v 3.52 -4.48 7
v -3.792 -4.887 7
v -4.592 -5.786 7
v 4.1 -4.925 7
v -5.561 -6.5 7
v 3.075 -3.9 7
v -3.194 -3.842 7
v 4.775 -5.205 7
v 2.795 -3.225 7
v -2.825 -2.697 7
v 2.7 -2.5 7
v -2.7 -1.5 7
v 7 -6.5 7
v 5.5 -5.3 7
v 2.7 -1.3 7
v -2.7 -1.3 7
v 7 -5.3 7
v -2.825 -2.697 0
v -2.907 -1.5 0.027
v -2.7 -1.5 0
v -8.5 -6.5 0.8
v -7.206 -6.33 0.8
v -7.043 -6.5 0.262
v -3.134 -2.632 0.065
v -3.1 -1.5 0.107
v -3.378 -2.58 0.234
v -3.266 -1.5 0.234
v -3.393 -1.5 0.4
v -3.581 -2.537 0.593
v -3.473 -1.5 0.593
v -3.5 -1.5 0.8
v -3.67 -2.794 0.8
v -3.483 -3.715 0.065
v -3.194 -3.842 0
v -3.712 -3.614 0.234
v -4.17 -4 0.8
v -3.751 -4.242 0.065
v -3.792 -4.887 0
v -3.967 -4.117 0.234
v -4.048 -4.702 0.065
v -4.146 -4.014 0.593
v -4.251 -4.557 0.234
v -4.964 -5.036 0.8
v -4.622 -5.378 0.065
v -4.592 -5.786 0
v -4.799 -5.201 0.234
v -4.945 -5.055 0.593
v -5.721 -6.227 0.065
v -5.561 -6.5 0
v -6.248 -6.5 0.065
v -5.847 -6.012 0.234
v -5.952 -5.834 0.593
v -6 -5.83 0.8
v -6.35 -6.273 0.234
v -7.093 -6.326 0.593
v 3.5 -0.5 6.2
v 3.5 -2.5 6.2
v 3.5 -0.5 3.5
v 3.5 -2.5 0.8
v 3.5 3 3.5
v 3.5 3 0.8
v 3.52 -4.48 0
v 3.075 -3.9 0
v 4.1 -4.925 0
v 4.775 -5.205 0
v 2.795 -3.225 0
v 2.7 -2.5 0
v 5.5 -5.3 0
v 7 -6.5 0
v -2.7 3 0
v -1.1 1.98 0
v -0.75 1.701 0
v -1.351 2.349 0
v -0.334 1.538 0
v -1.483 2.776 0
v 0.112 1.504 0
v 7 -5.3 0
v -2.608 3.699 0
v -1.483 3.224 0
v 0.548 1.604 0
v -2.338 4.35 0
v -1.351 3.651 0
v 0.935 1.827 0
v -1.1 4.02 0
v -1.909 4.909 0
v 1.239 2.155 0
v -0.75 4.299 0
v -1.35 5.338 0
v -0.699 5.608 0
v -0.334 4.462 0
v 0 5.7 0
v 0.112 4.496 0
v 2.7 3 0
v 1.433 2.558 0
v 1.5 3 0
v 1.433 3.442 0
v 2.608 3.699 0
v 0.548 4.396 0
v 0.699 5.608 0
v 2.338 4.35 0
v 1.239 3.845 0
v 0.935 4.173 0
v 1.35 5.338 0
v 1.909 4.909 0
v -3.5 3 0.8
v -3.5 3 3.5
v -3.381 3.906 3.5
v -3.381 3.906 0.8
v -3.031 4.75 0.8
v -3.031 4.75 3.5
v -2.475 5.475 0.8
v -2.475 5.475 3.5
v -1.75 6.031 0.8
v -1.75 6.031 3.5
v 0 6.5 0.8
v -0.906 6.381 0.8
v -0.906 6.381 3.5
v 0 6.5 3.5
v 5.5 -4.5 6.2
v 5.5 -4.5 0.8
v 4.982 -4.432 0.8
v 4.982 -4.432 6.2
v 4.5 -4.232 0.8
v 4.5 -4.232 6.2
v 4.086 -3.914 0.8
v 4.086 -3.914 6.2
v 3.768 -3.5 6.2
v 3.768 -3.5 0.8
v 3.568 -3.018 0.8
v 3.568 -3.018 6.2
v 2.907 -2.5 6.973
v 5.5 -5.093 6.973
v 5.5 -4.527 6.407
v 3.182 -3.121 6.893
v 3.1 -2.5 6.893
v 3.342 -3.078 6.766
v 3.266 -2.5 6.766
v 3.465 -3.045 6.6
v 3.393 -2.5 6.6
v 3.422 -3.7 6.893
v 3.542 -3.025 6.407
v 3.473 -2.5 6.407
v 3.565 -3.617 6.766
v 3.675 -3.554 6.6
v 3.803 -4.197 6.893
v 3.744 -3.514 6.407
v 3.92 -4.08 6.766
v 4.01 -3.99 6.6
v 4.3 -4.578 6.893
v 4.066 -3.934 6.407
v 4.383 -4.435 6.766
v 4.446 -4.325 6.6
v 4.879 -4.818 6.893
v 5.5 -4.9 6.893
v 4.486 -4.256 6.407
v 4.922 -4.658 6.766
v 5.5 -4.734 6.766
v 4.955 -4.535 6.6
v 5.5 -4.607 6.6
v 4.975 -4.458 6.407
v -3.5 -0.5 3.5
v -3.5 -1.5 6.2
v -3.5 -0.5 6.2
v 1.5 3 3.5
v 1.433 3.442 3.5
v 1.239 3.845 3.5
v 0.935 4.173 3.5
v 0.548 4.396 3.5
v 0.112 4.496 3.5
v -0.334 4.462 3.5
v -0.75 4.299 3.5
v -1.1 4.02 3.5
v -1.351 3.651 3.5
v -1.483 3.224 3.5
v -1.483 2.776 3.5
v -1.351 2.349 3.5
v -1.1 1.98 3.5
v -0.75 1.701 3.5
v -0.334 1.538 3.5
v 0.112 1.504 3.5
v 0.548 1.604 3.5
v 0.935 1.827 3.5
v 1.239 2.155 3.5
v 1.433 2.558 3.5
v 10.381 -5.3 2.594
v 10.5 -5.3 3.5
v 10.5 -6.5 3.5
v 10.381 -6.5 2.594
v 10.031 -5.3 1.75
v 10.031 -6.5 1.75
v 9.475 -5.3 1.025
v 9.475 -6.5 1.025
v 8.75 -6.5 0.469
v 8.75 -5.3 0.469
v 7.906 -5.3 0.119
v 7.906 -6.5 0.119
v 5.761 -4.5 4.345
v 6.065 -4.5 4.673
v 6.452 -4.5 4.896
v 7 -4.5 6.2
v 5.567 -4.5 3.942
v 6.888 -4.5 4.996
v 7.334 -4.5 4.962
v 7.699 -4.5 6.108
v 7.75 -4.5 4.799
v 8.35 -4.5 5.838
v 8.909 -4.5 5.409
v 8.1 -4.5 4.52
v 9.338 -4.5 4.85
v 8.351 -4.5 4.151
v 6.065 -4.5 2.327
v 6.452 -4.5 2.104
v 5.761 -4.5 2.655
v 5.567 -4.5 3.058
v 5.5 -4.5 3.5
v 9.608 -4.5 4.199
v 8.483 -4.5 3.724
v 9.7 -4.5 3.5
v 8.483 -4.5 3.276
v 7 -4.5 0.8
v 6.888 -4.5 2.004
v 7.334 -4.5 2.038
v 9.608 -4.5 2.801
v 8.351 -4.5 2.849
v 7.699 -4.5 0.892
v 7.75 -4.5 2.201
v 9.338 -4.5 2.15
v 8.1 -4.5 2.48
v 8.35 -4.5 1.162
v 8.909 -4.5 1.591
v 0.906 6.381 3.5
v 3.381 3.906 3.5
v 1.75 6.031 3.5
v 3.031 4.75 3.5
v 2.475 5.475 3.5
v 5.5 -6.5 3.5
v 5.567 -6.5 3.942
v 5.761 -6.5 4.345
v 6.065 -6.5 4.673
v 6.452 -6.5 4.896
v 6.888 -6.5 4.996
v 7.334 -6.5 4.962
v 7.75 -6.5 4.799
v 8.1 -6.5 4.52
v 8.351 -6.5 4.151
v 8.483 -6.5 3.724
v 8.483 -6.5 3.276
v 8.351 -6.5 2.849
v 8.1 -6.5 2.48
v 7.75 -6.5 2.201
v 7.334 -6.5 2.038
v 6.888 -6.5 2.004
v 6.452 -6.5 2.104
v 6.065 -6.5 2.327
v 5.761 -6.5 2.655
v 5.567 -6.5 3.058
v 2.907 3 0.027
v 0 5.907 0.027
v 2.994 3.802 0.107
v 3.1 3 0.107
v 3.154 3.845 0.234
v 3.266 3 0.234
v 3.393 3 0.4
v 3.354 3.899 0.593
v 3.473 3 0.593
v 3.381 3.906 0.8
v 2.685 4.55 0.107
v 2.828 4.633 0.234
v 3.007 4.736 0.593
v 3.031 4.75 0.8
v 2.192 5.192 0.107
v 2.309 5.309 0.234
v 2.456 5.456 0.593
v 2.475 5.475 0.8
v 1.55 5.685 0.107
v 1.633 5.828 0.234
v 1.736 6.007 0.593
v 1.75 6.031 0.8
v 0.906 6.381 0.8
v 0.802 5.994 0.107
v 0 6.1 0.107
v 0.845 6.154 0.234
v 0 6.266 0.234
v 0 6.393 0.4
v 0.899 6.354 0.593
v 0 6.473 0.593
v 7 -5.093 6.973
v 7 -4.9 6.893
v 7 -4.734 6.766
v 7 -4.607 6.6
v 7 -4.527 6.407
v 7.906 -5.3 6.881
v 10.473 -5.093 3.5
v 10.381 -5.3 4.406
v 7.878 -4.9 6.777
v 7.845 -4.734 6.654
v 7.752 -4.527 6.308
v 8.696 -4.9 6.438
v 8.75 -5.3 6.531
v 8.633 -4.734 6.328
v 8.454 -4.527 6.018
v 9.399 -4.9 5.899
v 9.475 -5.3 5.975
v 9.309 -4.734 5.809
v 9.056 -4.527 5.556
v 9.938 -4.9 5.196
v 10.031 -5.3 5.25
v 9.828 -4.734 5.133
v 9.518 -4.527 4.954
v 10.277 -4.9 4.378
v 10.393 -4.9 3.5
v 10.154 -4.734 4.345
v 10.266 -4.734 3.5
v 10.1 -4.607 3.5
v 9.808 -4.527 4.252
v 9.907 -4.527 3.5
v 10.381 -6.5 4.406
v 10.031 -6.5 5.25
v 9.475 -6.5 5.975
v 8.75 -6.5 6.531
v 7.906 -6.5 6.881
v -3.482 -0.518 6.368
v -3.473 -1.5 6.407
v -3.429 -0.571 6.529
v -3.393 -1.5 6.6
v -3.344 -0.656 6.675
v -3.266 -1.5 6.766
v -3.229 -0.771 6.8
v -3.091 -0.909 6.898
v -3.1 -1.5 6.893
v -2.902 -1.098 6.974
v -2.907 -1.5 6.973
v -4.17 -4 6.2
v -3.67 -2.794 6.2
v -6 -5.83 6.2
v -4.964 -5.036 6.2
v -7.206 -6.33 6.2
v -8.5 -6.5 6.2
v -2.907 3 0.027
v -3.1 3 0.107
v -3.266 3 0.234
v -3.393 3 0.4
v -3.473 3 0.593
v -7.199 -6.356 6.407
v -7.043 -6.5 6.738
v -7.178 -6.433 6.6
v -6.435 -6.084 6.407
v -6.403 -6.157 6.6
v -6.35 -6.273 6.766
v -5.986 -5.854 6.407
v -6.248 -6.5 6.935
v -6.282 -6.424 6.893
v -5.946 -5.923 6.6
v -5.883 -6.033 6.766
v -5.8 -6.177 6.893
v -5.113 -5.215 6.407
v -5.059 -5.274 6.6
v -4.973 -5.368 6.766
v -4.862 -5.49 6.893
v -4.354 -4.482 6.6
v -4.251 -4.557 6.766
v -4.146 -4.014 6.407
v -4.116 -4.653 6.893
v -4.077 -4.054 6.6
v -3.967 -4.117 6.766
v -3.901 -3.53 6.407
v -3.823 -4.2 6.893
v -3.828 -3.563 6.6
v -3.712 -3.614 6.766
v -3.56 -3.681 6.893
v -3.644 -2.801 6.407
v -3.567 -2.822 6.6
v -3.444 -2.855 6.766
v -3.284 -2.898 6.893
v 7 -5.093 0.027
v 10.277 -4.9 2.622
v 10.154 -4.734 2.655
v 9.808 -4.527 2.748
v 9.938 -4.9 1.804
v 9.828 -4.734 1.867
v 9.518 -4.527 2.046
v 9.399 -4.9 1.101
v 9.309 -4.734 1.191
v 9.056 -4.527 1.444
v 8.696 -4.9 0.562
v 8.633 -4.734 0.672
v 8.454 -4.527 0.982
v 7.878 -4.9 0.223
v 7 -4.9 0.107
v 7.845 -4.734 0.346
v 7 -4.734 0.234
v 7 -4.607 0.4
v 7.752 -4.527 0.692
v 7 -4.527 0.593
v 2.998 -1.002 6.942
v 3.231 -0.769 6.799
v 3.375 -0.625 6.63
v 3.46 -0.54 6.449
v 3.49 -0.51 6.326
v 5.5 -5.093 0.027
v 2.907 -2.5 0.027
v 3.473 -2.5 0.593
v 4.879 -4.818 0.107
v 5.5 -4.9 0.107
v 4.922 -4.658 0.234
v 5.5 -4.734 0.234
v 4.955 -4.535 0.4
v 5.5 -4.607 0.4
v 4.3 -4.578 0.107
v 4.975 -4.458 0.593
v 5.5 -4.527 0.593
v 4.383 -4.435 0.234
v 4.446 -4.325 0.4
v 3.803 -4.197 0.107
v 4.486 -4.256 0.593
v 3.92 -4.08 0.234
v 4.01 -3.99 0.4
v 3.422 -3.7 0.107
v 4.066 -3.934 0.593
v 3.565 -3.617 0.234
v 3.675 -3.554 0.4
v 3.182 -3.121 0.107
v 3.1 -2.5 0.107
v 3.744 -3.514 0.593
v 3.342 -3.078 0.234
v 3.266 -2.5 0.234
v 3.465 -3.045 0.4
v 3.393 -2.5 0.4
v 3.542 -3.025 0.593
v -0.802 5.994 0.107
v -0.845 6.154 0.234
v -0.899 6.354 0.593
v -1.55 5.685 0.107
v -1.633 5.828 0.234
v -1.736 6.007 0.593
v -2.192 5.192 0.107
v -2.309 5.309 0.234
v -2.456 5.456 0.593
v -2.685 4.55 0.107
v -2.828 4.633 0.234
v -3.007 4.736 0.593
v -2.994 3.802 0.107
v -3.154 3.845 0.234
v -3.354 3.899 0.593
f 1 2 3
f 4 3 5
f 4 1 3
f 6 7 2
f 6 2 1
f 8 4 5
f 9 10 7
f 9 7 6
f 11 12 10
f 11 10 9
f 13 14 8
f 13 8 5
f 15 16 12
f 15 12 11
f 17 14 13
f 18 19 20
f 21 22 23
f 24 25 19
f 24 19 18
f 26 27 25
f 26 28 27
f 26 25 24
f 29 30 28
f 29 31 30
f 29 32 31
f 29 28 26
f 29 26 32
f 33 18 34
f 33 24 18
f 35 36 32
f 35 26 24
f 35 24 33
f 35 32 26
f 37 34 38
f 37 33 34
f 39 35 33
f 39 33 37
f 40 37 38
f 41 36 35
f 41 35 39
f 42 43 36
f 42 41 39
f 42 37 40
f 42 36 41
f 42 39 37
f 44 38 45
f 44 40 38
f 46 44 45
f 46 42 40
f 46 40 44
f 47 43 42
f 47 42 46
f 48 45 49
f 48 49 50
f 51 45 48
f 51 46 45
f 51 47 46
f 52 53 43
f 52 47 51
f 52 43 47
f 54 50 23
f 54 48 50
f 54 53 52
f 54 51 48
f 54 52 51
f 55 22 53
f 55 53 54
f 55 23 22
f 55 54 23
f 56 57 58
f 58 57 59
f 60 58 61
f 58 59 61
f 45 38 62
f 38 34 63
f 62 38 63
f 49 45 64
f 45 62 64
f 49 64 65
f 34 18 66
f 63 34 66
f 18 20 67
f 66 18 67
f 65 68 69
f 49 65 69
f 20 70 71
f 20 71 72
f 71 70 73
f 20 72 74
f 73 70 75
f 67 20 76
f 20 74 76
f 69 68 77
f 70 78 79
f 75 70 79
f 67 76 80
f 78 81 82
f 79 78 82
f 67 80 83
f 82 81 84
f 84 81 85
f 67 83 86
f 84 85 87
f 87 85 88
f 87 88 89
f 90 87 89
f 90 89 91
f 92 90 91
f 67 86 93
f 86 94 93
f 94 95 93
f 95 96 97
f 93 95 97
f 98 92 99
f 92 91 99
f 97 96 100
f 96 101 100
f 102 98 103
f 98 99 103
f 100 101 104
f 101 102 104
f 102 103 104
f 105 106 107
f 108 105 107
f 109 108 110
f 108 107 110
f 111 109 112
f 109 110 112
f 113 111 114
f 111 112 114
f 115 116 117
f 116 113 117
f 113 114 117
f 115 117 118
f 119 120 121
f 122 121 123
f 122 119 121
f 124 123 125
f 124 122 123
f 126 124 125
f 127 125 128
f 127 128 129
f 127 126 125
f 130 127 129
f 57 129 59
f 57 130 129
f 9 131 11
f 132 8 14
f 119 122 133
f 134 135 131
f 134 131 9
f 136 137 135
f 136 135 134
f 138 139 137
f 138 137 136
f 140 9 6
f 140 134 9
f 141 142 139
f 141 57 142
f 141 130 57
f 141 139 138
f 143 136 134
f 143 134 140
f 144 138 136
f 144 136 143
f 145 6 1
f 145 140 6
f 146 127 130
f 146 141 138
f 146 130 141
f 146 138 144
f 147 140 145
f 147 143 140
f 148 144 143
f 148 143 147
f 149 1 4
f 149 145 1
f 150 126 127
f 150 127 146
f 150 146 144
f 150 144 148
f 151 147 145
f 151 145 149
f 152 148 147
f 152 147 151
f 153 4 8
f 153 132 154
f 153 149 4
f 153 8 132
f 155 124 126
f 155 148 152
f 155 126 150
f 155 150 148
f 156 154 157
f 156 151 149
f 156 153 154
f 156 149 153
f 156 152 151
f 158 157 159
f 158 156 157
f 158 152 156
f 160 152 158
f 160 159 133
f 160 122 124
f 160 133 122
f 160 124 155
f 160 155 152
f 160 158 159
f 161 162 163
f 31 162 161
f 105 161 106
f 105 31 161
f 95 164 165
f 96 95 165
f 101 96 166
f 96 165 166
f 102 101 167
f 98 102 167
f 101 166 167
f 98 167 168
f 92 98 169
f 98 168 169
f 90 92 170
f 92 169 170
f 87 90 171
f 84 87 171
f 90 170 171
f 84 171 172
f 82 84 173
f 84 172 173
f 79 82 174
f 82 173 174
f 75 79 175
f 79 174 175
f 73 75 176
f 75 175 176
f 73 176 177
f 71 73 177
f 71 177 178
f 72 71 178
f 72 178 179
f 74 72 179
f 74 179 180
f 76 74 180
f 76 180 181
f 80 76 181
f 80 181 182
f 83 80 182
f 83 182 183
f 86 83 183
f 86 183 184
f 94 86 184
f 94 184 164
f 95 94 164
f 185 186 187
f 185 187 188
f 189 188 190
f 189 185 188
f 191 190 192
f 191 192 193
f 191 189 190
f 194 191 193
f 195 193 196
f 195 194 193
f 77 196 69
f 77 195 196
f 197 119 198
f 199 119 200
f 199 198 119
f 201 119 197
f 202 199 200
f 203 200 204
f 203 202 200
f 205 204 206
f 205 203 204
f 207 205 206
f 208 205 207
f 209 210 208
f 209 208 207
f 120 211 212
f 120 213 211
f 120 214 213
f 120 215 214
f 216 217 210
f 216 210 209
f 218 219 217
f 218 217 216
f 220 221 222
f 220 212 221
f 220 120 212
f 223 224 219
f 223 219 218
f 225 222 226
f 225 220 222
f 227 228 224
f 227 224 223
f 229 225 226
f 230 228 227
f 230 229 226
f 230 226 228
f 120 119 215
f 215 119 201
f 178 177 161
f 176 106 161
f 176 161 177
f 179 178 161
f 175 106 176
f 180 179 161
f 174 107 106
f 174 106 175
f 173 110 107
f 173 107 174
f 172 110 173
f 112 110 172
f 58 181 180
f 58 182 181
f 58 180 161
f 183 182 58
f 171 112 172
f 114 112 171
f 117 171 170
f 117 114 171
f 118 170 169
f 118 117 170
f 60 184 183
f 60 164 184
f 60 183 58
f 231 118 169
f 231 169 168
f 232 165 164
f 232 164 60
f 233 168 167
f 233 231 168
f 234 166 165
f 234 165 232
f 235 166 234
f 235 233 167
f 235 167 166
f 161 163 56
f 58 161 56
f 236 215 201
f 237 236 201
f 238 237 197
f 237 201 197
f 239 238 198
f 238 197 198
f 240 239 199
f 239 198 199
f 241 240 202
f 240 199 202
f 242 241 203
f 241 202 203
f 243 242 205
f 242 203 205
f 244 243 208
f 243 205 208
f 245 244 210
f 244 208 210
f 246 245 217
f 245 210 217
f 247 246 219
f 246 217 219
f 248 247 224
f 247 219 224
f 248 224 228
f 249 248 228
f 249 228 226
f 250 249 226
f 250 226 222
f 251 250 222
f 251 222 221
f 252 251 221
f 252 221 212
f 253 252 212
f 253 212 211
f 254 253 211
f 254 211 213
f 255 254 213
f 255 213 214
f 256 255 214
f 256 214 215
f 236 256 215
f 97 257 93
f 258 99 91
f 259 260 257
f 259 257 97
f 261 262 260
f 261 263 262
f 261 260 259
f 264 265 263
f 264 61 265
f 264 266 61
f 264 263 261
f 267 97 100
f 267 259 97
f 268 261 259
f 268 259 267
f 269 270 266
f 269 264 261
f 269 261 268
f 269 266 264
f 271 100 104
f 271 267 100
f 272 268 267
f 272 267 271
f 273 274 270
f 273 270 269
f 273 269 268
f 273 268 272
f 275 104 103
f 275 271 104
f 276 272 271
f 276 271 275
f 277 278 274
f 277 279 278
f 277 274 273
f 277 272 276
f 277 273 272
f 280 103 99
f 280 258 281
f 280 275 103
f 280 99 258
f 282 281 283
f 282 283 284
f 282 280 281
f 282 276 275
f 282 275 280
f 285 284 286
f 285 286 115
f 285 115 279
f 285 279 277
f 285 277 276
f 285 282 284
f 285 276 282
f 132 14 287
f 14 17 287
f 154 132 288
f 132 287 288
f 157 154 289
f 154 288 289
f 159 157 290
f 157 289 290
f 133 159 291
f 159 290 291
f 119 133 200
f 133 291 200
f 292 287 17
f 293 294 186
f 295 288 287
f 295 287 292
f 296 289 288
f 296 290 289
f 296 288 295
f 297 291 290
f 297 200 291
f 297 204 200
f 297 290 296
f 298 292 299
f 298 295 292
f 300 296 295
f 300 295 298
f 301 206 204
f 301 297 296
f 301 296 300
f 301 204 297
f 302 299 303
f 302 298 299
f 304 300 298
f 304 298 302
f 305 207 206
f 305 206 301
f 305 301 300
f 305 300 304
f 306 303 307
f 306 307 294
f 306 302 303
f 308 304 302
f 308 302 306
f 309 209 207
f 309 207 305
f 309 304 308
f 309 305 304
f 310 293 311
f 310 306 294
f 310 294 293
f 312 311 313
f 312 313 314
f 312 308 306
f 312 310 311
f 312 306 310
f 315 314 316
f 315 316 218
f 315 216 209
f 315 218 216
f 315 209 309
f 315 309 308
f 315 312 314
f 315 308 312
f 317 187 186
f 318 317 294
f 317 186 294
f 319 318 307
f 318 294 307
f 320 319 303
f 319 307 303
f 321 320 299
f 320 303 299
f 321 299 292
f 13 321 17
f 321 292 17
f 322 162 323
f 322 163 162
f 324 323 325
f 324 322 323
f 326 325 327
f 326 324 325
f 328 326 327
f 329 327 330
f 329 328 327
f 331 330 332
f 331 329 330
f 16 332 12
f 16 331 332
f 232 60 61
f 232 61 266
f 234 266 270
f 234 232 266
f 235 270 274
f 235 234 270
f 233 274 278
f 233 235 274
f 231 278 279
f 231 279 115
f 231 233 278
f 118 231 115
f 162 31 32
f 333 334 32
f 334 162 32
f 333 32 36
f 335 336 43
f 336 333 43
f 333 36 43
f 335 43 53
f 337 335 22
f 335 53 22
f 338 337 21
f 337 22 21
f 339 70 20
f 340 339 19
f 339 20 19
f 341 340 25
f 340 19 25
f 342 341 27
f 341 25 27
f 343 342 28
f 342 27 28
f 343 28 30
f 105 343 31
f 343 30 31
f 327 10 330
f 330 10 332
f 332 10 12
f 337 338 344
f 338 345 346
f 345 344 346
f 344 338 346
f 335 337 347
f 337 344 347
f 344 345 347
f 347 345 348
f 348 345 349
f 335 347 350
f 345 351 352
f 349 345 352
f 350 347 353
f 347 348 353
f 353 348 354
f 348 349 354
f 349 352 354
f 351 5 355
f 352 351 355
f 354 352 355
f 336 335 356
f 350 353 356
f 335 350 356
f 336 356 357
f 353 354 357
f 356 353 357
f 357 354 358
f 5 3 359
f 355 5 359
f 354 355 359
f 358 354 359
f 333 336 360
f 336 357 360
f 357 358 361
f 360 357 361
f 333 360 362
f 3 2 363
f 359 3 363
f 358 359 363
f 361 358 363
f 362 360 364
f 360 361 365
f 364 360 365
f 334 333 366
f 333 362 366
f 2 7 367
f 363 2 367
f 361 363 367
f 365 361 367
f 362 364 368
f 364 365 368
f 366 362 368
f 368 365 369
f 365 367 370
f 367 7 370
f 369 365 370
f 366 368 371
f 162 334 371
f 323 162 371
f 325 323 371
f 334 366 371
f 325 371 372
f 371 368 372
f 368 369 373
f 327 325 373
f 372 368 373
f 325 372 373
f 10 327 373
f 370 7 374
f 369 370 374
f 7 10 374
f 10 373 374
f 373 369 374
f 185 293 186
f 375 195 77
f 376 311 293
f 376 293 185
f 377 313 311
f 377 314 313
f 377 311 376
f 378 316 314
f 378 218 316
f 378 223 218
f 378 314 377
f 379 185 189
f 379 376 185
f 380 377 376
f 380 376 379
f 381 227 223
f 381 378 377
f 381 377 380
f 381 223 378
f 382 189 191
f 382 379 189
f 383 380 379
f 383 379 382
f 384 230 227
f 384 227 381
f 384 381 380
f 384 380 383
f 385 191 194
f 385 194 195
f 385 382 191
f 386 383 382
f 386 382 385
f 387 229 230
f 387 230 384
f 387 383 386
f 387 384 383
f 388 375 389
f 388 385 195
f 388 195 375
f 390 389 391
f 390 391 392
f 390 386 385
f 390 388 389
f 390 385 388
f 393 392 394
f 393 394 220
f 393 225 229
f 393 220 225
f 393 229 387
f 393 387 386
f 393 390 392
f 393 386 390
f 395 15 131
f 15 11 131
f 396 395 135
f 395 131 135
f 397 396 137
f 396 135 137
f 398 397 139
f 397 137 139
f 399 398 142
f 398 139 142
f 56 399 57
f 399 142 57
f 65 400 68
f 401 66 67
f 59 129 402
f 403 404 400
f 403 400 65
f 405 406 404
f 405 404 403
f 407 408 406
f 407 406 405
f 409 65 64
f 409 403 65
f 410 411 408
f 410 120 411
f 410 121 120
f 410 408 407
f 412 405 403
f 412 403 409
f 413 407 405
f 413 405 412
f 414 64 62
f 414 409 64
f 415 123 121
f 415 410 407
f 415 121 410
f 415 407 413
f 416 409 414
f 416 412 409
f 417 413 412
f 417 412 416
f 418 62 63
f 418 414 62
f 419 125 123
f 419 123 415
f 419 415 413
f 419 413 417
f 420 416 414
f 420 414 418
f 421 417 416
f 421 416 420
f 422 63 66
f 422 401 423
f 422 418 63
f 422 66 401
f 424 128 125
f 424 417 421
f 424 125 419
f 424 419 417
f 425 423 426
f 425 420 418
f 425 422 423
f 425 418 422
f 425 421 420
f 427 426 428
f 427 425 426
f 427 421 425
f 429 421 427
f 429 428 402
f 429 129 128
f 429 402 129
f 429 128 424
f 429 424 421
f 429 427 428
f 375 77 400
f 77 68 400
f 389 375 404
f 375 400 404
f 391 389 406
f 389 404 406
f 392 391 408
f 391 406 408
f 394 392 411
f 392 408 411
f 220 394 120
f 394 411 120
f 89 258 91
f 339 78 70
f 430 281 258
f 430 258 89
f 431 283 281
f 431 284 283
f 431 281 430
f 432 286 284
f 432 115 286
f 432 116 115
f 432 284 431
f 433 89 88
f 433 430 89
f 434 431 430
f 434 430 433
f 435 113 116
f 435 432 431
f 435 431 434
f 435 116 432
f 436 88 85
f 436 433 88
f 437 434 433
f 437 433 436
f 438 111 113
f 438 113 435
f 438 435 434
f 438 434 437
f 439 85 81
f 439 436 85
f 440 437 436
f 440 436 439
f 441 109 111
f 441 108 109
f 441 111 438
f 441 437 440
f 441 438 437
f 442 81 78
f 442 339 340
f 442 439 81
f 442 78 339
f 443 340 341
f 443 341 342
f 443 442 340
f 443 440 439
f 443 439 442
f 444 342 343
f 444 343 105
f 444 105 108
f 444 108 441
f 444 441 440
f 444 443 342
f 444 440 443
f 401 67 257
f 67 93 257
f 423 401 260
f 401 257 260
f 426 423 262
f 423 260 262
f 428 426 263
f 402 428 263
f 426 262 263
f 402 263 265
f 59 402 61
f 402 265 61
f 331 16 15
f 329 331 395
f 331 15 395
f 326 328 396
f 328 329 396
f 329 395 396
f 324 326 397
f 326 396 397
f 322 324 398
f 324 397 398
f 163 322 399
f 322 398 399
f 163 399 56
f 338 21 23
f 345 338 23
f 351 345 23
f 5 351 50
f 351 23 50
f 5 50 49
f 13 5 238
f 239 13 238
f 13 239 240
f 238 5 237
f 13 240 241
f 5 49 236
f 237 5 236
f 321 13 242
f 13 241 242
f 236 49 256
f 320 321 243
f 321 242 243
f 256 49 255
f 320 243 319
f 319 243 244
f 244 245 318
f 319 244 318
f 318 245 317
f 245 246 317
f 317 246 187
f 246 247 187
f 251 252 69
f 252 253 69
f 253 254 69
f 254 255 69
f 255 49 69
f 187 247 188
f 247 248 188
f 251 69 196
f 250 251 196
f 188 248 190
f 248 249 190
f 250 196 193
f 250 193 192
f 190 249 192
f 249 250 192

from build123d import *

# Parameters (mm, degrees)
SKETCH_1_W          = 7
SKETCH_1_H          = 13
SKETCH_1_H_2        = 2
EXTRUDE_1_DEPTH     = 7
SKETCH_2_W          = 7
SKETCH_2_H          = 7
CUT_EXTRUDE_1_DEPTH = 3.5
FILLET_1_R          = 3.5
SKETCH_3_R          = 1.5
CUT_EXTRUDE_2_DEPTH = 13.835497653
SKETCH_4_R          = 1.5
CUT_EXTRUDE_3_DEPTH = 17.740669043
FILLET_2_R          = 2
FILLET_3_R          = 0.8


with BuildPart() as part:
    # 草图1 → 凸台-拉伸1 (new body)
    with BuildSketch(Plane.XY):
        with BuildLine():
            Line((-8.5, -6.5), (-3.5, -6.5))
            Line((-3.5, -6.5), (-3.5, -1.5))
            ThreePointArc((-3.5, -1.5), (-4.964466094, -5.035533906), (-8.5, -6.5))
        make_face()
        Rectangle(SKETCH_1_W, SKETCH_1_H)
        with Locations((7, -5.5)):
            Rectangle(SKETCH_1_W, SKETCH_1_H_2)
    extrude(amount=EXTRUDE_1_DEPTH)

    # 草图2 → 切除-拉伸1 (cut)
    with BuildSketch(Plane.XY.offset(7)):
        with Locations((0, 3)):
            Rectangle(SKETCH_2_W, SKETCH_2_H)
    extrude(amount=-CUT_EXTRUDE_1_DEPTH, mode=Mode.SUBTRACT)

    # 圆角1
    fillet_1_edges = [part.edges().sort_by_distance(p)[0] for p in [
        (10.5, -5.5, 0),
        (10.5, -5.5, 7),
        (3.5, 6.5, 1.75),
        (-3.5, 6.5, 1.75),
    ]]
    fillet(fillet_1_edges, radius=FILLET_1_R - 0.0001)  # a hair under: the kernel refuses the full size

    # 草图3 → 切除-拉伸2 (cut, through all)
    with BuildSketch(Plane.XY.offset(3.5)):
        with Locations((0, 3)):
            Circle(SKETCH_3_R)
    extrude(amount=-CUT_EXTRUDE_2_DEPTH, mode=Mode.SUBTRACT)

    # 草图4 → 切除-拉伸3 (cut, through all)
    with BuildSketch(Plane(origin=(0, -4.5, 0), x_dir=(1, 0, 0), z_dir=(0, 1, 0))):
        with Locations(Location((7, -3.5, 0), (0, 0, 180))):
            Circle(SKETCH_4_R)
    extrude(amount=-CUT_EXTRUDE_3_DEPTH, mode=Mode.SUBTRACT)

    # 圆角2
    fillet_2_edges = [part.edges().sort_by_distance(p)[0] for p in [
        (3.5, -4.5, 3.5),
    ]]
    fillet(fillet_2_edges, radius=FILLET_2_R - 0.0001)  # a hair under: the kernel refuses the full size

    # 圆角3
    fillet_3_edges = [part.edges().sort_by_distance(p)[0] for p in [
        (-4.964466094, -5.035533906, 0),
        (3.5, -1.50005, 7),
        (-3.5, -1, 7),
        (0, -0.5, 7),
        (-4.964466094, -5.035533906, 7),
        (6.25, -4.5, 0),
        (6.25, -4.5, 7),
        (9.474903023, -4.5, 5.974903023),
        (9.474903023, -4.5, 1.025096977),
        (-3.5, 0.75005, 0),
        (3.5, 0.25, 0),
        (-2.474903023, 5.474903023, 0),
        (2.474903023, 5.474903023, 0),
        (4.085757148, -3.914242852, 0),
        (4.085757148, -3.914242852, 7),
    ]]
    fillet(fillet_3_edges, radius=FILLET_3_R)


solid = part.part
